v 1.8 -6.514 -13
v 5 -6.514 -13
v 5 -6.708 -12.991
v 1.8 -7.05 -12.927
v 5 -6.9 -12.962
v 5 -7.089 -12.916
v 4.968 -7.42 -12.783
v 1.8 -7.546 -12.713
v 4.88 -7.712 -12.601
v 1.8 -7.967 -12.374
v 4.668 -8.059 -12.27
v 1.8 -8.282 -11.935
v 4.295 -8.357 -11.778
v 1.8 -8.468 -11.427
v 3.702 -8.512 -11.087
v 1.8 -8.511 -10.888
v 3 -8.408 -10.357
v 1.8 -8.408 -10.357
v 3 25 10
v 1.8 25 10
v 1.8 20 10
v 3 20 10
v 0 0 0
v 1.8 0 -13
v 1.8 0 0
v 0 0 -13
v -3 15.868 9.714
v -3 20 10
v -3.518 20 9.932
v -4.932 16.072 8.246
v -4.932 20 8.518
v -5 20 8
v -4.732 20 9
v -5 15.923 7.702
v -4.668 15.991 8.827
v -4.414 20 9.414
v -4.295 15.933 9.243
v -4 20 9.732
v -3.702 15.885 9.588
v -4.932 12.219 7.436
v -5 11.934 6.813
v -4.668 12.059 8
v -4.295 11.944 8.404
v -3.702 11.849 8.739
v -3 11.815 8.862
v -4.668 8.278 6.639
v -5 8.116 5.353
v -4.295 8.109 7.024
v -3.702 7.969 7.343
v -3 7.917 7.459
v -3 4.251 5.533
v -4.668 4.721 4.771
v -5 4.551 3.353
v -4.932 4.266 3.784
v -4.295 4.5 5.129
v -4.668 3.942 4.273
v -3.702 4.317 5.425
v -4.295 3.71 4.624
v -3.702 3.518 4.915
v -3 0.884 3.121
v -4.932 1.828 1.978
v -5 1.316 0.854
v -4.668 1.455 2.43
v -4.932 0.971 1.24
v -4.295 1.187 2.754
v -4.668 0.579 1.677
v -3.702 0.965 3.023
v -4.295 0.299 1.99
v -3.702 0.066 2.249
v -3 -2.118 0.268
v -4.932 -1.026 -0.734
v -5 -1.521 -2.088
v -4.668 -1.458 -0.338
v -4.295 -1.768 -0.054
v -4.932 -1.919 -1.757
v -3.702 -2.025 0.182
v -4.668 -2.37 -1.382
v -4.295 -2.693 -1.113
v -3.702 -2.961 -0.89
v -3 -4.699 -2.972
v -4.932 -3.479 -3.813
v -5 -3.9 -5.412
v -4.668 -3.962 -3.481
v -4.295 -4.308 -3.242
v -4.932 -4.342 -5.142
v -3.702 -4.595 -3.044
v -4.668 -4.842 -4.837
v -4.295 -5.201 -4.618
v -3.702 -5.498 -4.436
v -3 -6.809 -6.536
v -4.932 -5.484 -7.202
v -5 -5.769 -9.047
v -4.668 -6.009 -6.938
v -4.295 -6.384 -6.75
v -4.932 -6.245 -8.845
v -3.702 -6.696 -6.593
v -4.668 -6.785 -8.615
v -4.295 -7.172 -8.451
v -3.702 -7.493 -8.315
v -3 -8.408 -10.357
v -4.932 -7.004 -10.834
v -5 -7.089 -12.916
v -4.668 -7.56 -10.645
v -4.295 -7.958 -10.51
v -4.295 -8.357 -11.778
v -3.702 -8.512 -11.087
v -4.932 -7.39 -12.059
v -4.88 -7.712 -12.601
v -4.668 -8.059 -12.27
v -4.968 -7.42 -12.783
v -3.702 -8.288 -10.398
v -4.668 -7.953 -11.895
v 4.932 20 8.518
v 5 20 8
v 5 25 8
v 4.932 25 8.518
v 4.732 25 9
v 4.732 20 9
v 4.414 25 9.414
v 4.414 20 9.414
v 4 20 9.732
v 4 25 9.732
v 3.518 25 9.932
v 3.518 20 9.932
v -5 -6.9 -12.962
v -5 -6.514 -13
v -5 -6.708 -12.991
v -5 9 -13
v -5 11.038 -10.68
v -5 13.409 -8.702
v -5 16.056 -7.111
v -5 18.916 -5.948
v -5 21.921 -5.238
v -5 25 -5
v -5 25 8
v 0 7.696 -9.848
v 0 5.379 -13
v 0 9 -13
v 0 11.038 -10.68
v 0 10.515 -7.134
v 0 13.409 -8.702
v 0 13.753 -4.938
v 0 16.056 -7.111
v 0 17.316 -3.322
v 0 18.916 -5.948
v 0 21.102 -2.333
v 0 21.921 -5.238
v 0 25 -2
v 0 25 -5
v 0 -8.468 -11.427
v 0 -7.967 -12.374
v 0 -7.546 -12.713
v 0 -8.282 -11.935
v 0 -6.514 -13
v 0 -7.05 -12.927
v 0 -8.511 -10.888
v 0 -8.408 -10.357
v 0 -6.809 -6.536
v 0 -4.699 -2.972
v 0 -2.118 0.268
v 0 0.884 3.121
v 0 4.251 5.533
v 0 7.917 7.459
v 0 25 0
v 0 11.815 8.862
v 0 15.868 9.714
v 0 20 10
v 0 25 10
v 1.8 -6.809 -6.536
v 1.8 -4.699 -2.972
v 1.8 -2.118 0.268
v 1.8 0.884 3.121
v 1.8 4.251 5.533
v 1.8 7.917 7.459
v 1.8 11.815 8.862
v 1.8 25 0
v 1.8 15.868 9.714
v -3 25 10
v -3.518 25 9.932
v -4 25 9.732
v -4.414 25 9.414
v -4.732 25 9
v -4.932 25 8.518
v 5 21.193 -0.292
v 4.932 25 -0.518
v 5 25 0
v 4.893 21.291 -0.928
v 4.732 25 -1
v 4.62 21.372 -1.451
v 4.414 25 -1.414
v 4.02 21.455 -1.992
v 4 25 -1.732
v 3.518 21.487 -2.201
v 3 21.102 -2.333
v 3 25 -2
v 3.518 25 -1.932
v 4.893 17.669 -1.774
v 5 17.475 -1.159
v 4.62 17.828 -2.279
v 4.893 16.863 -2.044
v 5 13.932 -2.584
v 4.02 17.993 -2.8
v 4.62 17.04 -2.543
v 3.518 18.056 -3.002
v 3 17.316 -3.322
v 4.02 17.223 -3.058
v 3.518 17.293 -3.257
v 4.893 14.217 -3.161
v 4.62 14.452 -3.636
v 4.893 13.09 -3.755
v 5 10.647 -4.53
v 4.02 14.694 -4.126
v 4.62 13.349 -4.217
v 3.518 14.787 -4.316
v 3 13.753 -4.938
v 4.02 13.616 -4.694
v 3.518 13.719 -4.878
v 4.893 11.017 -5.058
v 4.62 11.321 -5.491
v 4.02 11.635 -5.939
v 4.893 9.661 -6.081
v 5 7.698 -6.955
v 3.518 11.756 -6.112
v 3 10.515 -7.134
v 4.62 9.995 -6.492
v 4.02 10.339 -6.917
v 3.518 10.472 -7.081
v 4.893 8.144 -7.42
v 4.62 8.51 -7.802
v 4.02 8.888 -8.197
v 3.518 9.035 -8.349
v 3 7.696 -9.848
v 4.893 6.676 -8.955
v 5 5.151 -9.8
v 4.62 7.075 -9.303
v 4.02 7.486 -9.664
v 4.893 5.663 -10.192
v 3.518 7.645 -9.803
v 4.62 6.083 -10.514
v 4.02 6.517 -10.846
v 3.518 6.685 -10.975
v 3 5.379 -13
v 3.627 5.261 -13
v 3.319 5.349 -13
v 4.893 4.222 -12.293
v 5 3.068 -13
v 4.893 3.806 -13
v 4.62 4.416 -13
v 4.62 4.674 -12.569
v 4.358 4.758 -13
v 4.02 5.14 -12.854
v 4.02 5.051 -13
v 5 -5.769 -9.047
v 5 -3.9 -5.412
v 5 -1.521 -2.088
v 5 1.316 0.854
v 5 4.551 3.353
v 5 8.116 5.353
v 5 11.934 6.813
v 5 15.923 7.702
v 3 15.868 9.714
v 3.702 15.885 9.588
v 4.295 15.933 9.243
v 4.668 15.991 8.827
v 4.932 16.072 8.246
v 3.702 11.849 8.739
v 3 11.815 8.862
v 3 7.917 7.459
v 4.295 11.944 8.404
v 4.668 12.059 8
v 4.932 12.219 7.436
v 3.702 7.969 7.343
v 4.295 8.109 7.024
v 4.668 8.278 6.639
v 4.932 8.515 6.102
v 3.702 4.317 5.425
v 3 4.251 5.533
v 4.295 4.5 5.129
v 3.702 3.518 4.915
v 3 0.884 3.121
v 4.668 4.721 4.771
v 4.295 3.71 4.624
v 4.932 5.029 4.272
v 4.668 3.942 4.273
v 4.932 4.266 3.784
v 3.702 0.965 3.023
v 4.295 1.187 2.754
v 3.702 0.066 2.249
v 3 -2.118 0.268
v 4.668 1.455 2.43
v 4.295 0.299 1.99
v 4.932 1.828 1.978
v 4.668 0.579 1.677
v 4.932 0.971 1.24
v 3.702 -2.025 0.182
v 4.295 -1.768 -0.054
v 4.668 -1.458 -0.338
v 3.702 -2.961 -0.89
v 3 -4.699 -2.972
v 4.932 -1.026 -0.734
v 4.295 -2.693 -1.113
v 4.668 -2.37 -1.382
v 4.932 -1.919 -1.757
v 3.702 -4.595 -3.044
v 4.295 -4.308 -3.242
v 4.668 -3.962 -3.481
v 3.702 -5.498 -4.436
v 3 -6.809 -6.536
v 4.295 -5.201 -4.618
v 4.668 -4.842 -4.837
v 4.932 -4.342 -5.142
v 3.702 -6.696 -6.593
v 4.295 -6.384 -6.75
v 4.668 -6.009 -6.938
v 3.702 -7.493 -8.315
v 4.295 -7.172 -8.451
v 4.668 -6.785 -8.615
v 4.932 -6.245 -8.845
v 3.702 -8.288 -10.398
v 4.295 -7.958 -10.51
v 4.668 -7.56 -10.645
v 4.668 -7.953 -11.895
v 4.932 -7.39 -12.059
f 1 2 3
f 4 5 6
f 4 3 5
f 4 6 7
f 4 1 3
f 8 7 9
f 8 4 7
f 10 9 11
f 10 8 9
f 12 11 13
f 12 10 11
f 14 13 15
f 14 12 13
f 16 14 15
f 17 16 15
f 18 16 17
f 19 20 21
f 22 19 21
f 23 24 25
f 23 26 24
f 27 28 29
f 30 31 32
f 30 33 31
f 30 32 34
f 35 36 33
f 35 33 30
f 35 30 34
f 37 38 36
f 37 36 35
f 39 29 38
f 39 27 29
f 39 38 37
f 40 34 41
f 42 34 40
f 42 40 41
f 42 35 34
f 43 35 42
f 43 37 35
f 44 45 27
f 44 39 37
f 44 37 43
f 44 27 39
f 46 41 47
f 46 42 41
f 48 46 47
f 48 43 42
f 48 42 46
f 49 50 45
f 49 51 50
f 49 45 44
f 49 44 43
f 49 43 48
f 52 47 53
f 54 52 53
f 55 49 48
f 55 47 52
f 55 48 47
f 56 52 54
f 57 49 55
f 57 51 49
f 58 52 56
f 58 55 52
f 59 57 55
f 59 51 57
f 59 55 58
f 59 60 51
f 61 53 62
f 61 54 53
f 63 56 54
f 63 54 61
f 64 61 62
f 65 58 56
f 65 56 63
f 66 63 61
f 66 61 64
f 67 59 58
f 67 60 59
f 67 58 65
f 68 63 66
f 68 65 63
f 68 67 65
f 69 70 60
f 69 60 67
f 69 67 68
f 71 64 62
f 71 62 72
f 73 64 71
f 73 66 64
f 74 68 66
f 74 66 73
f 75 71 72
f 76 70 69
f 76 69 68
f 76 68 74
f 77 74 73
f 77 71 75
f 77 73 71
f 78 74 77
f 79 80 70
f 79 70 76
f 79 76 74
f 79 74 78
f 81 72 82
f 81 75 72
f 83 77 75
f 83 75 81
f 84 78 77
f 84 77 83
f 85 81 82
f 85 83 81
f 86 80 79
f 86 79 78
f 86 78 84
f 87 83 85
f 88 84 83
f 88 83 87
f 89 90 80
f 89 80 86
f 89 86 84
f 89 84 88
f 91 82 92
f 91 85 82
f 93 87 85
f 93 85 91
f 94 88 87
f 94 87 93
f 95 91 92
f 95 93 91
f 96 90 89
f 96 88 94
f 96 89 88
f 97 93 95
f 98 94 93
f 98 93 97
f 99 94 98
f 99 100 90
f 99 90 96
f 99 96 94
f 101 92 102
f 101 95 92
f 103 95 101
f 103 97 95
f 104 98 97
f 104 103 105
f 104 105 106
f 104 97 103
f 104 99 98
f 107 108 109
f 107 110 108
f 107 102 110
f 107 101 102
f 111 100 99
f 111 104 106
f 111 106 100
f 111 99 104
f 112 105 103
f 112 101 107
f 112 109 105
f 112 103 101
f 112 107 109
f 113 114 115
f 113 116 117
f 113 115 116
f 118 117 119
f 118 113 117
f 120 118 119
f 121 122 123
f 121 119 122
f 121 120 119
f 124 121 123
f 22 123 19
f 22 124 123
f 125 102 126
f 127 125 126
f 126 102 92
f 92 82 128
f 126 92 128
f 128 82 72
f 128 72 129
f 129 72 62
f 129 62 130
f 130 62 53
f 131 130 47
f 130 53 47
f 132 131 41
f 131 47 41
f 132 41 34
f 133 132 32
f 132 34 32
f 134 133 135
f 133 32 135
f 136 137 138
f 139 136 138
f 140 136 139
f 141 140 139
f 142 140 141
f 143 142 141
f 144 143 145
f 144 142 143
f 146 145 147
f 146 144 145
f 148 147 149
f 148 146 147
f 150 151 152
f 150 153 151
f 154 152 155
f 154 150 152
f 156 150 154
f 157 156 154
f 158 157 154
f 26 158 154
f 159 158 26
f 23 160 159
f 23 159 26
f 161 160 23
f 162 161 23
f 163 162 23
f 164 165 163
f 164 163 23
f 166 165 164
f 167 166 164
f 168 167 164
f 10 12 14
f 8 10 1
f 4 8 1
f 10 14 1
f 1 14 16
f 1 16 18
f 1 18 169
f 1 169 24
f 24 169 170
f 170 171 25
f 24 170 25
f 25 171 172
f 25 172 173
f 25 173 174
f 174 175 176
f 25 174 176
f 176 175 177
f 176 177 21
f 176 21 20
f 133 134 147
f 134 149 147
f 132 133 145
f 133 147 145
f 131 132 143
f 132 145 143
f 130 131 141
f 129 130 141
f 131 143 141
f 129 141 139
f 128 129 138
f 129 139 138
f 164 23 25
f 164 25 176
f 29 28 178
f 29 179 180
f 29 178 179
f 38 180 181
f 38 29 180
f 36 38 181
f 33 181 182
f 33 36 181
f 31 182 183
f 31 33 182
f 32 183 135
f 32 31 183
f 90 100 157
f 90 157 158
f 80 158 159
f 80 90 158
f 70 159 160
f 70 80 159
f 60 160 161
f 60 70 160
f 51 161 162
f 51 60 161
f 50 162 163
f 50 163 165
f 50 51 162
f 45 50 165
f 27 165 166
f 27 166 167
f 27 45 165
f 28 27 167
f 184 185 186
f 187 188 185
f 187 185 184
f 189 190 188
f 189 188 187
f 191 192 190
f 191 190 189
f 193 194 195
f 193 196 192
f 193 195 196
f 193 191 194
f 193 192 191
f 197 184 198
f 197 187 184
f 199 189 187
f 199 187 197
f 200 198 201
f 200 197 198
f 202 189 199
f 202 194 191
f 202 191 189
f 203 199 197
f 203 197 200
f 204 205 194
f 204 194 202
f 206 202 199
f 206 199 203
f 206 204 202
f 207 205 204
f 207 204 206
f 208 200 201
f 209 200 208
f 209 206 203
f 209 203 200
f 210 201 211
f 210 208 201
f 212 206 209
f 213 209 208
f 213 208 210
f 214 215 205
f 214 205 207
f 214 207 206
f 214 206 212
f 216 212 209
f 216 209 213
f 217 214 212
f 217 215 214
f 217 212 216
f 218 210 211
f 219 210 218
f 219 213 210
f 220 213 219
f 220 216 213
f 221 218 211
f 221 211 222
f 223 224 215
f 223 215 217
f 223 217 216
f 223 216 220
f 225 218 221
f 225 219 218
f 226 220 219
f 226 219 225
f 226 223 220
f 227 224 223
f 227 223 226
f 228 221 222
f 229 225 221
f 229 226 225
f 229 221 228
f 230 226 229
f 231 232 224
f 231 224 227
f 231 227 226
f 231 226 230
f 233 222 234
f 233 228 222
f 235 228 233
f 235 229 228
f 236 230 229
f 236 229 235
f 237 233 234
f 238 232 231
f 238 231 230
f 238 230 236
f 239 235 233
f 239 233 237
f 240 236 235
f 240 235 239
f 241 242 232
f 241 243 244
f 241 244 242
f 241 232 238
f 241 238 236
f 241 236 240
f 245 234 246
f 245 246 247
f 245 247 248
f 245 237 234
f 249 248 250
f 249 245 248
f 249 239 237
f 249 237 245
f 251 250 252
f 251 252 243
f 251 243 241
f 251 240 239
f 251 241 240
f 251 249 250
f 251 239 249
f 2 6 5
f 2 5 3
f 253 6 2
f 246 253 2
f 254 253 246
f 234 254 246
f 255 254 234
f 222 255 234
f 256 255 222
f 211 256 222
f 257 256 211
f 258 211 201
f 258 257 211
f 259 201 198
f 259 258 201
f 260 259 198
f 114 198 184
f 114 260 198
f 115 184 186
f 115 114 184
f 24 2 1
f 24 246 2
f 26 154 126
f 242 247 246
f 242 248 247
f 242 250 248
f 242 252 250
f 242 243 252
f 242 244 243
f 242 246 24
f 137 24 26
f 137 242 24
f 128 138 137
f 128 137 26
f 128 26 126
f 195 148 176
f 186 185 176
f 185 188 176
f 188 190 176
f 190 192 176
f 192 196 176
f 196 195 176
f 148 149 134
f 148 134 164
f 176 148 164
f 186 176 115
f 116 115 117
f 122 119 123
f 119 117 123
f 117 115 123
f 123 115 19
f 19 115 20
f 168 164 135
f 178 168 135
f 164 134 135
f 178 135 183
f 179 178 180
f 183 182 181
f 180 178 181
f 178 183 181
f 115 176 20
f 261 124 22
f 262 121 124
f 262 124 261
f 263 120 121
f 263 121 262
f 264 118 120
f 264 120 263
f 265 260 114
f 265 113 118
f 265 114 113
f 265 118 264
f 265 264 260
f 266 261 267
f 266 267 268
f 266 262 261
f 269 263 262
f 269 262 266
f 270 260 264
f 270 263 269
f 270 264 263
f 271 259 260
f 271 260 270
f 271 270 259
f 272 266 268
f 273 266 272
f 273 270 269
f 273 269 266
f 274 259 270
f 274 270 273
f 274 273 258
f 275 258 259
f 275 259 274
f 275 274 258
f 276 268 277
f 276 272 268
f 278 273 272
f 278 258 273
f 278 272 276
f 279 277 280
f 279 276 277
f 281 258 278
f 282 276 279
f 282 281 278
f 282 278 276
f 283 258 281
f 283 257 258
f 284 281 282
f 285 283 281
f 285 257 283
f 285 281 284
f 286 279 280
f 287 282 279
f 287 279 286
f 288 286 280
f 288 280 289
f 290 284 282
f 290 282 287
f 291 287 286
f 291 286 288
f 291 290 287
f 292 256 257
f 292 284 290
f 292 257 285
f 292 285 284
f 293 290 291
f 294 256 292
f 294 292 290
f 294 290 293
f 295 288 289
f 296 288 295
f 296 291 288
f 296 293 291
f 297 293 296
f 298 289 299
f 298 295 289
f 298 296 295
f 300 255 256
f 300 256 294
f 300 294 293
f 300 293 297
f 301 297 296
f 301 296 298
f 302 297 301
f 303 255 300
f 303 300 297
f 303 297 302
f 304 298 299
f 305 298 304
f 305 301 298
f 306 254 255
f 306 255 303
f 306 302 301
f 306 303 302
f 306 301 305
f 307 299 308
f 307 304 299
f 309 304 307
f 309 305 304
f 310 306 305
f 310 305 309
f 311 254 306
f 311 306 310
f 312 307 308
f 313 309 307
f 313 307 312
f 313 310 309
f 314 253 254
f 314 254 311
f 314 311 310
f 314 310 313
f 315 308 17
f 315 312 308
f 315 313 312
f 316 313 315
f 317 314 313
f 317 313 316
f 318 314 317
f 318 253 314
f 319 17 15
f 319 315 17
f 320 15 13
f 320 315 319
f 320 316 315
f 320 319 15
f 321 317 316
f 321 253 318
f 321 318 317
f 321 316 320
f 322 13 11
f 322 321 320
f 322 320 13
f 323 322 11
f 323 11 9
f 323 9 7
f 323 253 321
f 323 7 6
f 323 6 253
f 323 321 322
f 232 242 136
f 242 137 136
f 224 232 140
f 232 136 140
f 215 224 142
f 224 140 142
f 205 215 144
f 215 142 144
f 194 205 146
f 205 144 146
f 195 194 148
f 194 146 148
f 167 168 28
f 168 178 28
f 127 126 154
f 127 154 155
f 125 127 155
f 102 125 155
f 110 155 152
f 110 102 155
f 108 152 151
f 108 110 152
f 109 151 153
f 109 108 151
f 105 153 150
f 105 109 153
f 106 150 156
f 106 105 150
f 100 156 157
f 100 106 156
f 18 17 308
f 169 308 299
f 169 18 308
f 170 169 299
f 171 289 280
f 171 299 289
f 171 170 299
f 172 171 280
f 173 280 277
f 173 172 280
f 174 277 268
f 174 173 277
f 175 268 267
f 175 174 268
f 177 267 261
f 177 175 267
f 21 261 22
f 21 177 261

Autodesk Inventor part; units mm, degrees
ref_plane "YZ Plane" through (0, 0, 0) normal (1, 0, 0) x (0, 1, 0)
ref_plane "XZ Plane" through (0, 0, 0) normal (0, 1, 0) x (-1, 0, 0)
ref_plane "XY Plane" through (0, 0, 0) normal (0, 0, 1) x (1, 0, 0)
sketch "Sketch1" plane through (0, 0, 0) normal (1, 0, 0) x (0, 1, 0)
  line L0 (0, 0) -> (50, 0)
  line L1 (50, 0) -> (50, -50)
  line L2 (50, -50) -> (0, -50)
  line L3 (0, -50) -> (0, 0)
  circle A0 centre (25, -25) radius 25
  line L4 (25, 0) -> (25, 10)
  line L5 (25, 10) -> (-10, 10)
  line L6 (-10, 10) -> (-10, -25)
  line L7 (-10, -25) -> (0, -25)
  line L8 (25, 0) -> (25, -25)
  line L9 (25, -25) -> (0, -25)
  circle A1 centre (25, -25) radius 20
  circle A2 centre (25, -25) radius 23
  point P0 (50, -25)
  point P1 (25, -50)
  point P2 (2, -25)
  point P3 (25, -2)
  point P4 (5, -25)
  point P5 (25, -5)
  dimension "d0" = 50
  dimension "d1" = 5
  dimension "d2" = 35
  dimension "d3" = 2
extrude "Extrusion1" add sketch "Sketch1" along normal blind 5 contours L3 L7 L6 L5 L4 L0 | L0 A0 L3 | L8 A2 L9 A0 picked at (1.8931, -17.824)
extrude "Extrusion2" add sketch "Sketch1" against normal blind 5 contours L3 L7 L6 L5 L4 L0 | L0 A0 L3 | L8 A2 L9 A0 | L8 A1 L9 A2 picked at (1.8931, -17.824) picked at (4.6117, -17.075)
extrude "Extrusion3" cut sketch "Sketch1" along normal blind 1.8 contours L3 L7 L6 L5 L4 L0
fillet "Fillet1" radius 30 2 edges at (3.4, -10, 10) (-2.5, -10, 10)
sketch "Sketch2" plane through (5, -10, -25) normal (0, 0, -1) x (-1, 0, 0)
  line L0 (20.3331, 29.5099) -> (-16.8181, 29.5099)
  line L1 (-16.8181, 29.5099) -> (-16.8181, -19.9518)
  line L2 (-16.8181, -19.9518) -> (20.3331, -19.9518)
  line L3 (20.3331, -19.9518) -> (20.3331, 29.5099)
  point P0 (5, 10)
extrude "Extrusion4" cut sketch "Sketch2" against normal blind 12
fillet "Fillet4" radius 2 7 edges at (3.4, -9.1719, -13) (-2.5, -9.1719, -13) (5, 22.5, 10) (5, 1.4258, 3.5584) (-5, 22.5, 10) (-5, 1.4258, 3.5584) (5, 13.7528, -4.9376)
properties part number "ESQUINERO_PUERTAS" material "Steel, Mild, Welded"
